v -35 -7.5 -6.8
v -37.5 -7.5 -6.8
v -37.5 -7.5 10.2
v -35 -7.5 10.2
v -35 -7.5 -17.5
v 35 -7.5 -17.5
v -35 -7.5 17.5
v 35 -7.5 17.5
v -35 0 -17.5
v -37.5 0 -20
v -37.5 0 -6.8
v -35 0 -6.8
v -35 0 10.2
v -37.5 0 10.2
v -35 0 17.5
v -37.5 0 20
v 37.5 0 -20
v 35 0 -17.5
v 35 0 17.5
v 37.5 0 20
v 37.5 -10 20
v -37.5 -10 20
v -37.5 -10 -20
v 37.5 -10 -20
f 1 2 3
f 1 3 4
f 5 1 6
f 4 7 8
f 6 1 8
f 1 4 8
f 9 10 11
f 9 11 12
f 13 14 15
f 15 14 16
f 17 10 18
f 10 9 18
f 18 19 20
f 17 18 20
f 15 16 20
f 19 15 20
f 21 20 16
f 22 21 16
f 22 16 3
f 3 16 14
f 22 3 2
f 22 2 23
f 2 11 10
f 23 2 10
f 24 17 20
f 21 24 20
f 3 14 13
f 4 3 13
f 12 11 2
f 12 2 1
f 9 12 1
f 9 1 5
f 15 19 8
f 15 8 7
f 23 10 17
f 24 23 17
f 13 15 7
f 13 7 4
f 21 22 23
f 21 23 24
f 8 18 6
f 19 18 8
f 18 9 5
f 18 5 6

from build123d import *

# Parameters (mm, degrees)
F0_W     = 2.5
F0_H     = 17
F1_DEPTH = 10
F2_DEPTH = 7.5


# Not quite as in the source:
# - a feature names something its author has since deleted; it is built from what else it names


with BuildPart() as f1:
    # F0 (on Front) → F1 (new body)
    with BuildSketch(Plane.XZ):
        Polygon((37.5, 20), (-37.5, 20), (-37.5, 10.2), (-35, 10.2), (-35, 17.5), (35, 17.5), (35, -17.5), (-35, -17.5), (-35, -6.8), (-37.5, -6.8), (-37.5, -20), (37.5, -20), align=None)
        with Locations((-36.25, 1.7)):
            Rectangle(F0_W, F0_H)
        Polygon((-35, 17.5), (-35, 10.2), (-35, -6.8), (-35, -17.5), (35, -17.5), (35, 17.5), align=None)
    extrude(amount=F1_DEPTH)

    # F0 (on Front) → F2 (cut)
    with BuildSketch(Plane.XZ):
        Polygon((-35, 17.5), (-35, 10.2), (-35, -6.8), (-35, -17.5), (35, -17.5), (35, 17.5), align=None)
        with Locations((-36.25, 1.7)):
            Rectangle(F0_W, F0_H)
    extrude(amount=F2_DEPTH, mode=Mode.SUBTRACT)


solid = f1.part
